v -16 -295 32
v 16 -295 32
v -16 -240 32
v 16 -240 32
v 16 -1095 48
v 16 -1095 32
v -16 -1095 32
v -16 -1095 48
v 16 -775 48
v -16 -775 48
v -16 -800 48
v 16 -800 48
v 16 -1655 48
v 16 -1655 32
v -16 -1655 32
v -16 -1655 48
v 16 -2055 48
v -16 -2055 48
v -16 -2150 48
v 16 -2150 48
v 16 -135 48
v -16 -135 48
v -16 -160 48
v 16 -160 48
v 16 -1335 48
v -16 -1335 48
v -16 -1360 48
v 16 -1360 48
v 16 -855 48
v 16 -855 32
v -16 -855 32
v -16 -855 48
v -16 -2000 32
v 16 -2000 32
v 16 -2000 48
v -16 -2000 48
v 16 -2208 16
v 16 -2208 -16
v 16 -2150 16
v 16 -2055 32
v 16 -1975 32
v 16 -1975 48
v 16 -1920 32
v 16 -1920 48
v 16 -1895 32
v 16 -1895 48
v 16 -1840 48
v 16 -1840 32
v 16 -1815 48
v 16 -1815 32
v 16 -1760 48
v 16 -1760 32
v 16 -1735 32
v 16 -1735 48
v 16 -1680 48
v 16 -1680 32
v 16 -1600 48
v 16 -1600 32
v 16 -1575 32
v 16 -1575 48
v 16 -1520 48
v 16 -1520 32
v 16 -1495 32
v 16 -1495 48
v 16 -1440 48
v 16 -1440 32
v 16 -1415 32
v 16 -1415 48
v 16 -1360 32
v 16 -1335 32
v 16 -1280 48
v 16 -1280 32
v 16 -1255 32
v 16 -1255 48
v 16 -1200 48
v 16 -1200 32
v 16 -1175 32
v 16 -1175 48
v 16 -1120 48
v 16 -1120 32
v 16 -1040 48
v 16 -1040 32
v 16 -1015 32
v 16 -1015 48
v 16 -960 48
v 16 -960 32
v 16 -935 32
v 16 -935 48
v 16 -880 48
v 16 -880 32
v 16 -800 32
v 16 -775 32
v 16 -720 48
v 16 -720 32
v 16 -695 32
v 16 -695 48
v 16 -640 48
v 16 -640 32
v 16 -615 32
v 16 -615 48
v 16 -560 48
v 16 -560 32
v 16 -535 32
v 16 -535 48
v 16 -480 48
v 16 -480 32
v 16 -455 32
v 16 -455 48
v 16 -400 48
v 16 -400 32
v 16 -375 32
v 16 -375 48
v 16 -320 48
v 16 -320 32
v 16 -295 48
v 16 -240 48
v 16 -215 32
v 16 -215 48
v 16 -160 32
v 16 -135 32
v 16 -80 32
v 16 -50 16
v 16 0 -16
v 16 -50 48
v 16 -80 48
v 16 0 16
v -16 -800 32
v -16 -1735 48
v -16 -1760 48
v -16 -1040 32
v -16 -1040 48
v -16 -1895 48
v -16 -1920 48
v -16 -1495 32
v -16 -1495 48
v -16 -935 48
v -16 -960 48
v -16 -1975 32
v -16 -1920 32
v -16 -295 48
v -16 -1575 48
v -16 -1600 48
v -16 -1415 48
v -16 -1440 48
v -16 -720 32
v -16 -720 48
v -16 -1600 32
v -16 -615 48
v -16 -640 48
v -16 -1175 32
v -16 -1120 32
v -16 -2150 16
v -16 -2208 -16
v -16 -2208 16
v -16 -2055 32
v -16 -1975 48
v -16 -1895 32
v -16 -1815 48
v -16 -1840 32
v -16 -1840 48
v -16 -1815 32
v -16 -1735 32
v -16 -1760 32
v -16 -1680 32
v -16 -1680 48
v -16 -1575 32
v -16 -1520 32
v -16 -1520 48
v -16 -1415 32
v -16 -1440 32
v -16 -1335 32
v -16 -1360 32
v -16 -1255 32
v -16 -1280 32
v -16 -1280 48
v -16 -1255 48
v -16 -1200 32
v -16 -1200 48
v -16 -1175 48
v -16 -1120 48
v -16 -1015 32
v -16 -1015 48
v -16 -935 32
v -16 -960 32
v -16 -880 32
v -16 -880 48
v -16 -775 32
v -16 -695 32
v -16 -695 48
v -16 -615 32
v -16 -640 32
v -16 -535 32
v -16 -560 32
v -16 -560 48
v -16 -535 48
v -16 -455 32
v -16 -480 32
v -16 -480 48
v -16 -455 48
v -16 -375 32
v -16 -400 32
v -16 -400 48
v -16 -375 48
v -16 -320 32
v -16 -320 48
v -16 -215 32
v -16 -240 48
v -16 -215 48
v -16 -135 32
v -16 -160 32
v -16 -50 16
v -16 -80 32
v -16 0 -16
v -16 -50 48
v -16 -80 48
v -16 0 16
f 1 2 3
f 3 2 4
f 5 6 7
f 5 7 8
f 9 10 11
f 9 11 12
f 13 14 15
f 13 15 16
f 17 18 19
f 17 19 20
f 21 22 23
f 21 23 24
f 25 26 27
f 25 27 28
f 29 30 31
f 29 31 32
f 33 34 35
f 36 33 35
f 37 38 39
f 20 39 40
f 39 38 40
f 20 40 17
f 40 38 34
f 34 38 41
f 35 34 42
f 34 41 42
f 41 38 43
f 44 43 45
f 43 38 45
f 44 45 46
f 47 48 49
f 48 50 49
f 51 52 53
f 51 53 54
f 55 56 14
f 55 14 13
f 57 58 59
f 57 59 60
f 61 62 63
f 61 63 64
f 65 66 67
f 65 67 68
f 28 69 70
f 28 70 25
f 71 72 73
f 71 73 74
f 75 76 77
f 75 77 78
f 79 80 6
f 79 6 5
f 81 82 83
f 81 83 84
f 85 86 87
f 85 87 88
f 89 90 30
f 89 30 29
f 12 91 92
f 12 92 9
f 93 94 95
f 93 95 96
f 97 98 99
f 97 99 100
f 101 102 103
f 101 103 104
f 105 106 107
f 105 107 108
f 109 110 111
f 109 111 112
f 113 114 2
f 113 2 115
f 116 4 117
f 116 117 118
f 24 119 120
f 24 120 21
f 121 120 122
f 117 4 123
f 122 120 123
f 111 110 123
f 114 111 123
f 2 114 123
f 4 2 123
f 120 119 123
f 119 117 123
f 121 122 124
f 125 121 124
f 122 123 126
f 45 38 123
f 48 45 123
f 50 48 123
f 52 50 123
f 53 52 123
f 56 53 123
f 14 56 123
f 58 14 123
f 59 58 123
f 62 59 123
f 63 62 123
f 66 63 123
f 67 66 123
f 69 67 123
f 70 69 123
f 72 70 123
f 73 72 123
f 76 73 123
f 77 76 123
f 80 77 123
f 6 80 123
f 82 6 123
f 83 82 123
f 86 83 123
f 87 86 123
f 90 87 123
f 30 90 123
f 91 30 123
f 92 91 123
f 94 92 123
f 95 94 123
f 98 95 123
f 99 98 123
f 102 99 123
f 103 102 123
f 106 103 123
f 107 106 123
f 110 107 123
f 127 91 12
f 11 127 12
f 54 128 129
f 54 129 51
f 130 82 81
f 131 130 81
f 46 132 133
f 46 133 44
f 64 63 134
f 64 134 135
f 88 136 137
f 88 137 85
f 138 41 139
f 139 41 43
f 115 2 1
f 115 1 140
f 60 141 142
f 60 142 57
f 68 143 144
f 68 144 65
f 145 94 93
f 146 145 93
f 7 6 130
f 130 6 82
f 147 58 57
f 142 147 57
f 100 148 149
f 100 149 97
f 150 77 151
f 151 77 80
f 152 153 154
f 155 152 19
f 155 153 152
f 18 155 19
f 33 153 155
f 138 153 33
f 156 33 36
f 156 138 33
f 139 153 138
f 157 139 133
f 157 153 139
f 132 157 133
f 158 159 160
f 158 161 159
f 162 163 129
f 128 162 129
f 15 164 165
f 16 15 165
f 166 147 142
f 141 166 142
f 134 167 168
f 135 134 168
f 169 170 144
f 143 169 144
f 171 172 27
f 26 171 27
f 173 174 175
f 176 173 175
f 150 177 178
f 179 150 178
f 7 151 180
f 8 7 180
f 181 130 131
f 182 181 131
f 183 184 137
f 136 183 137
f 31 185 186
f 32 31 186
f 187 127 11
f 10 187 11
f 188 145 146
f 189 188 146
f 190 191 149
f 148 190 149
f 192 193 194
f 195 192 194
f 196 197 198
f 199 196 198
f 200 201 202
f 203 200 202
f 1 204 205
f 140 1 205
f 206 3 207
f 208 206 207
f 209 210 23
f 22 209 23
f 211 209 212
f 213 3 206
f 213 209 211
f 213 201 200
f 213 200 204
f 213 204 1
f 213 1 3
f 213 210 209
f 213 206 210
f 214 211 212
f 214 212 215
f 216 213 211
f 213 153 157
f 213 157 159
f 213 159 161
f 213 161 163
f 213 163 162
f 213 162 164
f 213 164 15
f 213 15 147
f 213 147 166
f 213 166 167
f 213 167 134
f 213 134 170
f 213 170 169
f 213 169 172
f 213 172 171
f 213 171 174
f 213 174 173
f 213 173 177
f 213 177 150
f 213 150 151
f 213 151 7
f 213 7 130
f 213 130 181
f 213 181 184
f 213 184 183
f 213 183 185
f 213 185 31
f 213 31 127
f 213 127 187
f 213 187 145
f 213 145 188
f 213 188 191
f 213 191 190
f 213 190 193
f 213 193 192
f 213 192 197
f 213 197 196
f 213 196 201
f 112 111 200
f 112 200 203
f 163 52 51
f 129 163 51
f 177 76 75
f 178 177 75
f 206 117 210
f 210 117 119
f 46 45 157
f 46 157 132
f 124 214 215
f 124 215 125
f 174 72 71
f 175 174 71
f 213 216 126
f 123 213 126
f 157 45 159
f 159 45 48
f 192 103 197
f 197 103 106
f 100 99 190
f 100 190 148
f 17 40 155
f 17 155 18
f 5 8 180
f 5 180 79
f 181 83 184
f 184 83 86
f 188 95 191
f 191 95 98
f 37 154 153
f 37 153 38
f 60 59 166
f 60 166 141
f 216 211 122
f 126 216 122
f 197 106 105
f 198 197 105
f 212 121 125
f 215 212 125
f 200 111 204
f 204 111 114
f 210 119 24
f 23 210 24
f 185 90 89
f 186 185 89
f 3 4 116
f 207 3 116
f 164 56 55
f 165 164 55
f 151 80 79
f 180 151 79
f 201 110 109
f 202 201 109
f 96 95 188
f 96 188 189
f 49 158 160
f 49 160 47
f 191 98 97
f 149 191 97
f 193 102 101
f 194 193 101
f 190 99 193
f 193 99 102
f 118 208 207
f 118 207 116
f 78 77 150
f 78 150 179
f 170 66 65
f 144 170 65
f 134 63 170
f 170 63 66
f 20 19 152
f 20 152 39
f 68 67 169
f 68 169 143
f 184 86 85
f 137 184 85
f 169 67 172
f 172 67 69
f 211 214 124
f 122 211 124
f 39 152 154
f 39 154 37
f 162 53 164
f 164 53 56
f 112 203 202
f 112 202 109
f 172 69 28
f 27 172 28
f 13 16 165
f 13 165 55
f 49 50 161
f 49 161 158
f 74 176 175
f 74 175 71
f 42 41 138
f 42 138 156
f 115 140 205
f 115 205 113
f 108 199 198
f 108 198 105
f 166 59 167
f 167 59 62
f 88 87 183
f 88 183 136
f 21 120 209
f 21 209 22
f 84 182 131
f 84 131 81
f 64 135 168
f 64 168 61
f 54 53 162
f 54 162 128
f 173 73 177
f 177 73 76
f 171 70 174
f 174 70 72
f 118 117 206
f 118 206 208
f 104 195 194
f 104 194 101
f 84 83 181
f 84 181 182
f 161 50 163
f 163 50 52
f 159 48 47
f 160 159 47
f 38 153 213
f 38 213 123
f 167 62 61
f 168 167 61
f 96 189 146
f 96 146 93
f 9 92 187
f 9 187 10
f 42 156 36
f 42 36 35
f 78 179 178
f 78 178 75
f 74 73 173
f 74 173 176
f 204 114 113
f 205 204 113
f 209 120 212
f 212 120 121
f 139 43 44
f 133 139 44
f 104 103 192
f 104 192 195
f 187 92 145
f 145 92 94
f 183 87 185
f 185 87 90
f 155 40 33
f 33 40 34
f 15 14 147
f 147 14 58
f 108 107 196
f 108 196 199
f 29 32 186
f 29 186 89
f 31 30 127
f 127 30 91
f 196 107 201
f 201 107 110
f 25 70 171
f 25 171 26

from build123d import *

# Parameters (mm, degrees)
F0_W     = 32
F0_H     = 32
F1_DEPTH = 2208
F3_W     = 32
F3_H     = 32
F4_DEPTH = 2100
F5_W     = 55
F5_H     = 20
F6_DEPTH = 32


with BuildPart() as f1:
    # F0 (on Front) → F1 (new body)
    with BuildSketch(Plane.XZ):
        Rectangle(F0_W, F0_H)
    extrude(amount=F1_DEPTH)

    # F3 (on offset) → F4 (join)
    with BuildSketch(Plane.XZ.offset(50)):
        with Locations((0, 32)):
            Rectangle(F3_W, F3_H)
    extrude(amount=F4_DEPTH)

    # F5 (on face) → F6 (cut)
    with BuildSketch(Plane.YZ.offset(16)):
        with Locations((-107.5, 42)):
            Rectangle(F5_W, F5_H)
        with Locations((-187.5, 42)):
            Rectangle(F5_W, F5_H)
        with Locations((-267.5, 42)):
            Rectangle(F5_W, F5_H)
        with Locations((-347.5, 42)):
            Rectangle(F5_W, F5_H)
        with Locations((-427.5, 42)):
            Rectangle(F5_W, F5_H)
        with Locations((-507.5, 42)):
            Rectangle(F5_W, F5_H)
        with Locations((-587.5, 42)):
            Rectangle(F5_W, F5_H)
        with Locations((-667.5, 42)):
            Rectangle(F5_W, F5_H)
        with Locations((-747.5, 42)):
            Rectangle(F5_W, F5_H)
        with Locations((-827.5, 42)):
            Rectangle(F5_W, F5_H)
        with Locations((-907.5, 42)):
            Rectangle(F5_W, F5_H)
        with Locations((-987.5, 42)):
            Rectangle(F5_W, F5_H)
        with Locations((-1067.5, 42)):
            Rectangle(F5_W, F5_H)
        with Locations((-1147.5, 42)):
            Rectangle(F5_W, F5_H)
        with Locations((-1227.5, 42)):
            Rectangle(F5_W, F5_H)
        with Locations((-1307.5, 42)):
            Rectangle(F5_W, F5_H)
        with Locations((-1387.5, 42)):
            Rectangle(F5_W, F5_H)
        with Locations((-1467.5, 42)):
            Rectangle(F5_W, F5_H)
        with Locations((-1547.5, 42)):
            Rectangle(F5_W, F5_H)
        with Locations((-1627.5, 42)):
            Rectangle(F5_W, F5_H)
        with Locations((-1707.5, 42)):
            Rectangle(F5_W, F5_H)
        with Locations((-1787.5, 42)):
            Rectangle(F5_W, F5_H)
        with Locations((-1867.5, 42)):
            Rectangle(F5_W, F5_H)
        with Locations((-1947.5, 42)):
            Rectangle(F5_W, F5_H)
        with Locations((-2027.5, 42)):
            Rectangle(F5_W, F5_H)
    extrude(amount=-F6_DEPTH, mode=Mode.SUBTRACT)


solid = f1.part
